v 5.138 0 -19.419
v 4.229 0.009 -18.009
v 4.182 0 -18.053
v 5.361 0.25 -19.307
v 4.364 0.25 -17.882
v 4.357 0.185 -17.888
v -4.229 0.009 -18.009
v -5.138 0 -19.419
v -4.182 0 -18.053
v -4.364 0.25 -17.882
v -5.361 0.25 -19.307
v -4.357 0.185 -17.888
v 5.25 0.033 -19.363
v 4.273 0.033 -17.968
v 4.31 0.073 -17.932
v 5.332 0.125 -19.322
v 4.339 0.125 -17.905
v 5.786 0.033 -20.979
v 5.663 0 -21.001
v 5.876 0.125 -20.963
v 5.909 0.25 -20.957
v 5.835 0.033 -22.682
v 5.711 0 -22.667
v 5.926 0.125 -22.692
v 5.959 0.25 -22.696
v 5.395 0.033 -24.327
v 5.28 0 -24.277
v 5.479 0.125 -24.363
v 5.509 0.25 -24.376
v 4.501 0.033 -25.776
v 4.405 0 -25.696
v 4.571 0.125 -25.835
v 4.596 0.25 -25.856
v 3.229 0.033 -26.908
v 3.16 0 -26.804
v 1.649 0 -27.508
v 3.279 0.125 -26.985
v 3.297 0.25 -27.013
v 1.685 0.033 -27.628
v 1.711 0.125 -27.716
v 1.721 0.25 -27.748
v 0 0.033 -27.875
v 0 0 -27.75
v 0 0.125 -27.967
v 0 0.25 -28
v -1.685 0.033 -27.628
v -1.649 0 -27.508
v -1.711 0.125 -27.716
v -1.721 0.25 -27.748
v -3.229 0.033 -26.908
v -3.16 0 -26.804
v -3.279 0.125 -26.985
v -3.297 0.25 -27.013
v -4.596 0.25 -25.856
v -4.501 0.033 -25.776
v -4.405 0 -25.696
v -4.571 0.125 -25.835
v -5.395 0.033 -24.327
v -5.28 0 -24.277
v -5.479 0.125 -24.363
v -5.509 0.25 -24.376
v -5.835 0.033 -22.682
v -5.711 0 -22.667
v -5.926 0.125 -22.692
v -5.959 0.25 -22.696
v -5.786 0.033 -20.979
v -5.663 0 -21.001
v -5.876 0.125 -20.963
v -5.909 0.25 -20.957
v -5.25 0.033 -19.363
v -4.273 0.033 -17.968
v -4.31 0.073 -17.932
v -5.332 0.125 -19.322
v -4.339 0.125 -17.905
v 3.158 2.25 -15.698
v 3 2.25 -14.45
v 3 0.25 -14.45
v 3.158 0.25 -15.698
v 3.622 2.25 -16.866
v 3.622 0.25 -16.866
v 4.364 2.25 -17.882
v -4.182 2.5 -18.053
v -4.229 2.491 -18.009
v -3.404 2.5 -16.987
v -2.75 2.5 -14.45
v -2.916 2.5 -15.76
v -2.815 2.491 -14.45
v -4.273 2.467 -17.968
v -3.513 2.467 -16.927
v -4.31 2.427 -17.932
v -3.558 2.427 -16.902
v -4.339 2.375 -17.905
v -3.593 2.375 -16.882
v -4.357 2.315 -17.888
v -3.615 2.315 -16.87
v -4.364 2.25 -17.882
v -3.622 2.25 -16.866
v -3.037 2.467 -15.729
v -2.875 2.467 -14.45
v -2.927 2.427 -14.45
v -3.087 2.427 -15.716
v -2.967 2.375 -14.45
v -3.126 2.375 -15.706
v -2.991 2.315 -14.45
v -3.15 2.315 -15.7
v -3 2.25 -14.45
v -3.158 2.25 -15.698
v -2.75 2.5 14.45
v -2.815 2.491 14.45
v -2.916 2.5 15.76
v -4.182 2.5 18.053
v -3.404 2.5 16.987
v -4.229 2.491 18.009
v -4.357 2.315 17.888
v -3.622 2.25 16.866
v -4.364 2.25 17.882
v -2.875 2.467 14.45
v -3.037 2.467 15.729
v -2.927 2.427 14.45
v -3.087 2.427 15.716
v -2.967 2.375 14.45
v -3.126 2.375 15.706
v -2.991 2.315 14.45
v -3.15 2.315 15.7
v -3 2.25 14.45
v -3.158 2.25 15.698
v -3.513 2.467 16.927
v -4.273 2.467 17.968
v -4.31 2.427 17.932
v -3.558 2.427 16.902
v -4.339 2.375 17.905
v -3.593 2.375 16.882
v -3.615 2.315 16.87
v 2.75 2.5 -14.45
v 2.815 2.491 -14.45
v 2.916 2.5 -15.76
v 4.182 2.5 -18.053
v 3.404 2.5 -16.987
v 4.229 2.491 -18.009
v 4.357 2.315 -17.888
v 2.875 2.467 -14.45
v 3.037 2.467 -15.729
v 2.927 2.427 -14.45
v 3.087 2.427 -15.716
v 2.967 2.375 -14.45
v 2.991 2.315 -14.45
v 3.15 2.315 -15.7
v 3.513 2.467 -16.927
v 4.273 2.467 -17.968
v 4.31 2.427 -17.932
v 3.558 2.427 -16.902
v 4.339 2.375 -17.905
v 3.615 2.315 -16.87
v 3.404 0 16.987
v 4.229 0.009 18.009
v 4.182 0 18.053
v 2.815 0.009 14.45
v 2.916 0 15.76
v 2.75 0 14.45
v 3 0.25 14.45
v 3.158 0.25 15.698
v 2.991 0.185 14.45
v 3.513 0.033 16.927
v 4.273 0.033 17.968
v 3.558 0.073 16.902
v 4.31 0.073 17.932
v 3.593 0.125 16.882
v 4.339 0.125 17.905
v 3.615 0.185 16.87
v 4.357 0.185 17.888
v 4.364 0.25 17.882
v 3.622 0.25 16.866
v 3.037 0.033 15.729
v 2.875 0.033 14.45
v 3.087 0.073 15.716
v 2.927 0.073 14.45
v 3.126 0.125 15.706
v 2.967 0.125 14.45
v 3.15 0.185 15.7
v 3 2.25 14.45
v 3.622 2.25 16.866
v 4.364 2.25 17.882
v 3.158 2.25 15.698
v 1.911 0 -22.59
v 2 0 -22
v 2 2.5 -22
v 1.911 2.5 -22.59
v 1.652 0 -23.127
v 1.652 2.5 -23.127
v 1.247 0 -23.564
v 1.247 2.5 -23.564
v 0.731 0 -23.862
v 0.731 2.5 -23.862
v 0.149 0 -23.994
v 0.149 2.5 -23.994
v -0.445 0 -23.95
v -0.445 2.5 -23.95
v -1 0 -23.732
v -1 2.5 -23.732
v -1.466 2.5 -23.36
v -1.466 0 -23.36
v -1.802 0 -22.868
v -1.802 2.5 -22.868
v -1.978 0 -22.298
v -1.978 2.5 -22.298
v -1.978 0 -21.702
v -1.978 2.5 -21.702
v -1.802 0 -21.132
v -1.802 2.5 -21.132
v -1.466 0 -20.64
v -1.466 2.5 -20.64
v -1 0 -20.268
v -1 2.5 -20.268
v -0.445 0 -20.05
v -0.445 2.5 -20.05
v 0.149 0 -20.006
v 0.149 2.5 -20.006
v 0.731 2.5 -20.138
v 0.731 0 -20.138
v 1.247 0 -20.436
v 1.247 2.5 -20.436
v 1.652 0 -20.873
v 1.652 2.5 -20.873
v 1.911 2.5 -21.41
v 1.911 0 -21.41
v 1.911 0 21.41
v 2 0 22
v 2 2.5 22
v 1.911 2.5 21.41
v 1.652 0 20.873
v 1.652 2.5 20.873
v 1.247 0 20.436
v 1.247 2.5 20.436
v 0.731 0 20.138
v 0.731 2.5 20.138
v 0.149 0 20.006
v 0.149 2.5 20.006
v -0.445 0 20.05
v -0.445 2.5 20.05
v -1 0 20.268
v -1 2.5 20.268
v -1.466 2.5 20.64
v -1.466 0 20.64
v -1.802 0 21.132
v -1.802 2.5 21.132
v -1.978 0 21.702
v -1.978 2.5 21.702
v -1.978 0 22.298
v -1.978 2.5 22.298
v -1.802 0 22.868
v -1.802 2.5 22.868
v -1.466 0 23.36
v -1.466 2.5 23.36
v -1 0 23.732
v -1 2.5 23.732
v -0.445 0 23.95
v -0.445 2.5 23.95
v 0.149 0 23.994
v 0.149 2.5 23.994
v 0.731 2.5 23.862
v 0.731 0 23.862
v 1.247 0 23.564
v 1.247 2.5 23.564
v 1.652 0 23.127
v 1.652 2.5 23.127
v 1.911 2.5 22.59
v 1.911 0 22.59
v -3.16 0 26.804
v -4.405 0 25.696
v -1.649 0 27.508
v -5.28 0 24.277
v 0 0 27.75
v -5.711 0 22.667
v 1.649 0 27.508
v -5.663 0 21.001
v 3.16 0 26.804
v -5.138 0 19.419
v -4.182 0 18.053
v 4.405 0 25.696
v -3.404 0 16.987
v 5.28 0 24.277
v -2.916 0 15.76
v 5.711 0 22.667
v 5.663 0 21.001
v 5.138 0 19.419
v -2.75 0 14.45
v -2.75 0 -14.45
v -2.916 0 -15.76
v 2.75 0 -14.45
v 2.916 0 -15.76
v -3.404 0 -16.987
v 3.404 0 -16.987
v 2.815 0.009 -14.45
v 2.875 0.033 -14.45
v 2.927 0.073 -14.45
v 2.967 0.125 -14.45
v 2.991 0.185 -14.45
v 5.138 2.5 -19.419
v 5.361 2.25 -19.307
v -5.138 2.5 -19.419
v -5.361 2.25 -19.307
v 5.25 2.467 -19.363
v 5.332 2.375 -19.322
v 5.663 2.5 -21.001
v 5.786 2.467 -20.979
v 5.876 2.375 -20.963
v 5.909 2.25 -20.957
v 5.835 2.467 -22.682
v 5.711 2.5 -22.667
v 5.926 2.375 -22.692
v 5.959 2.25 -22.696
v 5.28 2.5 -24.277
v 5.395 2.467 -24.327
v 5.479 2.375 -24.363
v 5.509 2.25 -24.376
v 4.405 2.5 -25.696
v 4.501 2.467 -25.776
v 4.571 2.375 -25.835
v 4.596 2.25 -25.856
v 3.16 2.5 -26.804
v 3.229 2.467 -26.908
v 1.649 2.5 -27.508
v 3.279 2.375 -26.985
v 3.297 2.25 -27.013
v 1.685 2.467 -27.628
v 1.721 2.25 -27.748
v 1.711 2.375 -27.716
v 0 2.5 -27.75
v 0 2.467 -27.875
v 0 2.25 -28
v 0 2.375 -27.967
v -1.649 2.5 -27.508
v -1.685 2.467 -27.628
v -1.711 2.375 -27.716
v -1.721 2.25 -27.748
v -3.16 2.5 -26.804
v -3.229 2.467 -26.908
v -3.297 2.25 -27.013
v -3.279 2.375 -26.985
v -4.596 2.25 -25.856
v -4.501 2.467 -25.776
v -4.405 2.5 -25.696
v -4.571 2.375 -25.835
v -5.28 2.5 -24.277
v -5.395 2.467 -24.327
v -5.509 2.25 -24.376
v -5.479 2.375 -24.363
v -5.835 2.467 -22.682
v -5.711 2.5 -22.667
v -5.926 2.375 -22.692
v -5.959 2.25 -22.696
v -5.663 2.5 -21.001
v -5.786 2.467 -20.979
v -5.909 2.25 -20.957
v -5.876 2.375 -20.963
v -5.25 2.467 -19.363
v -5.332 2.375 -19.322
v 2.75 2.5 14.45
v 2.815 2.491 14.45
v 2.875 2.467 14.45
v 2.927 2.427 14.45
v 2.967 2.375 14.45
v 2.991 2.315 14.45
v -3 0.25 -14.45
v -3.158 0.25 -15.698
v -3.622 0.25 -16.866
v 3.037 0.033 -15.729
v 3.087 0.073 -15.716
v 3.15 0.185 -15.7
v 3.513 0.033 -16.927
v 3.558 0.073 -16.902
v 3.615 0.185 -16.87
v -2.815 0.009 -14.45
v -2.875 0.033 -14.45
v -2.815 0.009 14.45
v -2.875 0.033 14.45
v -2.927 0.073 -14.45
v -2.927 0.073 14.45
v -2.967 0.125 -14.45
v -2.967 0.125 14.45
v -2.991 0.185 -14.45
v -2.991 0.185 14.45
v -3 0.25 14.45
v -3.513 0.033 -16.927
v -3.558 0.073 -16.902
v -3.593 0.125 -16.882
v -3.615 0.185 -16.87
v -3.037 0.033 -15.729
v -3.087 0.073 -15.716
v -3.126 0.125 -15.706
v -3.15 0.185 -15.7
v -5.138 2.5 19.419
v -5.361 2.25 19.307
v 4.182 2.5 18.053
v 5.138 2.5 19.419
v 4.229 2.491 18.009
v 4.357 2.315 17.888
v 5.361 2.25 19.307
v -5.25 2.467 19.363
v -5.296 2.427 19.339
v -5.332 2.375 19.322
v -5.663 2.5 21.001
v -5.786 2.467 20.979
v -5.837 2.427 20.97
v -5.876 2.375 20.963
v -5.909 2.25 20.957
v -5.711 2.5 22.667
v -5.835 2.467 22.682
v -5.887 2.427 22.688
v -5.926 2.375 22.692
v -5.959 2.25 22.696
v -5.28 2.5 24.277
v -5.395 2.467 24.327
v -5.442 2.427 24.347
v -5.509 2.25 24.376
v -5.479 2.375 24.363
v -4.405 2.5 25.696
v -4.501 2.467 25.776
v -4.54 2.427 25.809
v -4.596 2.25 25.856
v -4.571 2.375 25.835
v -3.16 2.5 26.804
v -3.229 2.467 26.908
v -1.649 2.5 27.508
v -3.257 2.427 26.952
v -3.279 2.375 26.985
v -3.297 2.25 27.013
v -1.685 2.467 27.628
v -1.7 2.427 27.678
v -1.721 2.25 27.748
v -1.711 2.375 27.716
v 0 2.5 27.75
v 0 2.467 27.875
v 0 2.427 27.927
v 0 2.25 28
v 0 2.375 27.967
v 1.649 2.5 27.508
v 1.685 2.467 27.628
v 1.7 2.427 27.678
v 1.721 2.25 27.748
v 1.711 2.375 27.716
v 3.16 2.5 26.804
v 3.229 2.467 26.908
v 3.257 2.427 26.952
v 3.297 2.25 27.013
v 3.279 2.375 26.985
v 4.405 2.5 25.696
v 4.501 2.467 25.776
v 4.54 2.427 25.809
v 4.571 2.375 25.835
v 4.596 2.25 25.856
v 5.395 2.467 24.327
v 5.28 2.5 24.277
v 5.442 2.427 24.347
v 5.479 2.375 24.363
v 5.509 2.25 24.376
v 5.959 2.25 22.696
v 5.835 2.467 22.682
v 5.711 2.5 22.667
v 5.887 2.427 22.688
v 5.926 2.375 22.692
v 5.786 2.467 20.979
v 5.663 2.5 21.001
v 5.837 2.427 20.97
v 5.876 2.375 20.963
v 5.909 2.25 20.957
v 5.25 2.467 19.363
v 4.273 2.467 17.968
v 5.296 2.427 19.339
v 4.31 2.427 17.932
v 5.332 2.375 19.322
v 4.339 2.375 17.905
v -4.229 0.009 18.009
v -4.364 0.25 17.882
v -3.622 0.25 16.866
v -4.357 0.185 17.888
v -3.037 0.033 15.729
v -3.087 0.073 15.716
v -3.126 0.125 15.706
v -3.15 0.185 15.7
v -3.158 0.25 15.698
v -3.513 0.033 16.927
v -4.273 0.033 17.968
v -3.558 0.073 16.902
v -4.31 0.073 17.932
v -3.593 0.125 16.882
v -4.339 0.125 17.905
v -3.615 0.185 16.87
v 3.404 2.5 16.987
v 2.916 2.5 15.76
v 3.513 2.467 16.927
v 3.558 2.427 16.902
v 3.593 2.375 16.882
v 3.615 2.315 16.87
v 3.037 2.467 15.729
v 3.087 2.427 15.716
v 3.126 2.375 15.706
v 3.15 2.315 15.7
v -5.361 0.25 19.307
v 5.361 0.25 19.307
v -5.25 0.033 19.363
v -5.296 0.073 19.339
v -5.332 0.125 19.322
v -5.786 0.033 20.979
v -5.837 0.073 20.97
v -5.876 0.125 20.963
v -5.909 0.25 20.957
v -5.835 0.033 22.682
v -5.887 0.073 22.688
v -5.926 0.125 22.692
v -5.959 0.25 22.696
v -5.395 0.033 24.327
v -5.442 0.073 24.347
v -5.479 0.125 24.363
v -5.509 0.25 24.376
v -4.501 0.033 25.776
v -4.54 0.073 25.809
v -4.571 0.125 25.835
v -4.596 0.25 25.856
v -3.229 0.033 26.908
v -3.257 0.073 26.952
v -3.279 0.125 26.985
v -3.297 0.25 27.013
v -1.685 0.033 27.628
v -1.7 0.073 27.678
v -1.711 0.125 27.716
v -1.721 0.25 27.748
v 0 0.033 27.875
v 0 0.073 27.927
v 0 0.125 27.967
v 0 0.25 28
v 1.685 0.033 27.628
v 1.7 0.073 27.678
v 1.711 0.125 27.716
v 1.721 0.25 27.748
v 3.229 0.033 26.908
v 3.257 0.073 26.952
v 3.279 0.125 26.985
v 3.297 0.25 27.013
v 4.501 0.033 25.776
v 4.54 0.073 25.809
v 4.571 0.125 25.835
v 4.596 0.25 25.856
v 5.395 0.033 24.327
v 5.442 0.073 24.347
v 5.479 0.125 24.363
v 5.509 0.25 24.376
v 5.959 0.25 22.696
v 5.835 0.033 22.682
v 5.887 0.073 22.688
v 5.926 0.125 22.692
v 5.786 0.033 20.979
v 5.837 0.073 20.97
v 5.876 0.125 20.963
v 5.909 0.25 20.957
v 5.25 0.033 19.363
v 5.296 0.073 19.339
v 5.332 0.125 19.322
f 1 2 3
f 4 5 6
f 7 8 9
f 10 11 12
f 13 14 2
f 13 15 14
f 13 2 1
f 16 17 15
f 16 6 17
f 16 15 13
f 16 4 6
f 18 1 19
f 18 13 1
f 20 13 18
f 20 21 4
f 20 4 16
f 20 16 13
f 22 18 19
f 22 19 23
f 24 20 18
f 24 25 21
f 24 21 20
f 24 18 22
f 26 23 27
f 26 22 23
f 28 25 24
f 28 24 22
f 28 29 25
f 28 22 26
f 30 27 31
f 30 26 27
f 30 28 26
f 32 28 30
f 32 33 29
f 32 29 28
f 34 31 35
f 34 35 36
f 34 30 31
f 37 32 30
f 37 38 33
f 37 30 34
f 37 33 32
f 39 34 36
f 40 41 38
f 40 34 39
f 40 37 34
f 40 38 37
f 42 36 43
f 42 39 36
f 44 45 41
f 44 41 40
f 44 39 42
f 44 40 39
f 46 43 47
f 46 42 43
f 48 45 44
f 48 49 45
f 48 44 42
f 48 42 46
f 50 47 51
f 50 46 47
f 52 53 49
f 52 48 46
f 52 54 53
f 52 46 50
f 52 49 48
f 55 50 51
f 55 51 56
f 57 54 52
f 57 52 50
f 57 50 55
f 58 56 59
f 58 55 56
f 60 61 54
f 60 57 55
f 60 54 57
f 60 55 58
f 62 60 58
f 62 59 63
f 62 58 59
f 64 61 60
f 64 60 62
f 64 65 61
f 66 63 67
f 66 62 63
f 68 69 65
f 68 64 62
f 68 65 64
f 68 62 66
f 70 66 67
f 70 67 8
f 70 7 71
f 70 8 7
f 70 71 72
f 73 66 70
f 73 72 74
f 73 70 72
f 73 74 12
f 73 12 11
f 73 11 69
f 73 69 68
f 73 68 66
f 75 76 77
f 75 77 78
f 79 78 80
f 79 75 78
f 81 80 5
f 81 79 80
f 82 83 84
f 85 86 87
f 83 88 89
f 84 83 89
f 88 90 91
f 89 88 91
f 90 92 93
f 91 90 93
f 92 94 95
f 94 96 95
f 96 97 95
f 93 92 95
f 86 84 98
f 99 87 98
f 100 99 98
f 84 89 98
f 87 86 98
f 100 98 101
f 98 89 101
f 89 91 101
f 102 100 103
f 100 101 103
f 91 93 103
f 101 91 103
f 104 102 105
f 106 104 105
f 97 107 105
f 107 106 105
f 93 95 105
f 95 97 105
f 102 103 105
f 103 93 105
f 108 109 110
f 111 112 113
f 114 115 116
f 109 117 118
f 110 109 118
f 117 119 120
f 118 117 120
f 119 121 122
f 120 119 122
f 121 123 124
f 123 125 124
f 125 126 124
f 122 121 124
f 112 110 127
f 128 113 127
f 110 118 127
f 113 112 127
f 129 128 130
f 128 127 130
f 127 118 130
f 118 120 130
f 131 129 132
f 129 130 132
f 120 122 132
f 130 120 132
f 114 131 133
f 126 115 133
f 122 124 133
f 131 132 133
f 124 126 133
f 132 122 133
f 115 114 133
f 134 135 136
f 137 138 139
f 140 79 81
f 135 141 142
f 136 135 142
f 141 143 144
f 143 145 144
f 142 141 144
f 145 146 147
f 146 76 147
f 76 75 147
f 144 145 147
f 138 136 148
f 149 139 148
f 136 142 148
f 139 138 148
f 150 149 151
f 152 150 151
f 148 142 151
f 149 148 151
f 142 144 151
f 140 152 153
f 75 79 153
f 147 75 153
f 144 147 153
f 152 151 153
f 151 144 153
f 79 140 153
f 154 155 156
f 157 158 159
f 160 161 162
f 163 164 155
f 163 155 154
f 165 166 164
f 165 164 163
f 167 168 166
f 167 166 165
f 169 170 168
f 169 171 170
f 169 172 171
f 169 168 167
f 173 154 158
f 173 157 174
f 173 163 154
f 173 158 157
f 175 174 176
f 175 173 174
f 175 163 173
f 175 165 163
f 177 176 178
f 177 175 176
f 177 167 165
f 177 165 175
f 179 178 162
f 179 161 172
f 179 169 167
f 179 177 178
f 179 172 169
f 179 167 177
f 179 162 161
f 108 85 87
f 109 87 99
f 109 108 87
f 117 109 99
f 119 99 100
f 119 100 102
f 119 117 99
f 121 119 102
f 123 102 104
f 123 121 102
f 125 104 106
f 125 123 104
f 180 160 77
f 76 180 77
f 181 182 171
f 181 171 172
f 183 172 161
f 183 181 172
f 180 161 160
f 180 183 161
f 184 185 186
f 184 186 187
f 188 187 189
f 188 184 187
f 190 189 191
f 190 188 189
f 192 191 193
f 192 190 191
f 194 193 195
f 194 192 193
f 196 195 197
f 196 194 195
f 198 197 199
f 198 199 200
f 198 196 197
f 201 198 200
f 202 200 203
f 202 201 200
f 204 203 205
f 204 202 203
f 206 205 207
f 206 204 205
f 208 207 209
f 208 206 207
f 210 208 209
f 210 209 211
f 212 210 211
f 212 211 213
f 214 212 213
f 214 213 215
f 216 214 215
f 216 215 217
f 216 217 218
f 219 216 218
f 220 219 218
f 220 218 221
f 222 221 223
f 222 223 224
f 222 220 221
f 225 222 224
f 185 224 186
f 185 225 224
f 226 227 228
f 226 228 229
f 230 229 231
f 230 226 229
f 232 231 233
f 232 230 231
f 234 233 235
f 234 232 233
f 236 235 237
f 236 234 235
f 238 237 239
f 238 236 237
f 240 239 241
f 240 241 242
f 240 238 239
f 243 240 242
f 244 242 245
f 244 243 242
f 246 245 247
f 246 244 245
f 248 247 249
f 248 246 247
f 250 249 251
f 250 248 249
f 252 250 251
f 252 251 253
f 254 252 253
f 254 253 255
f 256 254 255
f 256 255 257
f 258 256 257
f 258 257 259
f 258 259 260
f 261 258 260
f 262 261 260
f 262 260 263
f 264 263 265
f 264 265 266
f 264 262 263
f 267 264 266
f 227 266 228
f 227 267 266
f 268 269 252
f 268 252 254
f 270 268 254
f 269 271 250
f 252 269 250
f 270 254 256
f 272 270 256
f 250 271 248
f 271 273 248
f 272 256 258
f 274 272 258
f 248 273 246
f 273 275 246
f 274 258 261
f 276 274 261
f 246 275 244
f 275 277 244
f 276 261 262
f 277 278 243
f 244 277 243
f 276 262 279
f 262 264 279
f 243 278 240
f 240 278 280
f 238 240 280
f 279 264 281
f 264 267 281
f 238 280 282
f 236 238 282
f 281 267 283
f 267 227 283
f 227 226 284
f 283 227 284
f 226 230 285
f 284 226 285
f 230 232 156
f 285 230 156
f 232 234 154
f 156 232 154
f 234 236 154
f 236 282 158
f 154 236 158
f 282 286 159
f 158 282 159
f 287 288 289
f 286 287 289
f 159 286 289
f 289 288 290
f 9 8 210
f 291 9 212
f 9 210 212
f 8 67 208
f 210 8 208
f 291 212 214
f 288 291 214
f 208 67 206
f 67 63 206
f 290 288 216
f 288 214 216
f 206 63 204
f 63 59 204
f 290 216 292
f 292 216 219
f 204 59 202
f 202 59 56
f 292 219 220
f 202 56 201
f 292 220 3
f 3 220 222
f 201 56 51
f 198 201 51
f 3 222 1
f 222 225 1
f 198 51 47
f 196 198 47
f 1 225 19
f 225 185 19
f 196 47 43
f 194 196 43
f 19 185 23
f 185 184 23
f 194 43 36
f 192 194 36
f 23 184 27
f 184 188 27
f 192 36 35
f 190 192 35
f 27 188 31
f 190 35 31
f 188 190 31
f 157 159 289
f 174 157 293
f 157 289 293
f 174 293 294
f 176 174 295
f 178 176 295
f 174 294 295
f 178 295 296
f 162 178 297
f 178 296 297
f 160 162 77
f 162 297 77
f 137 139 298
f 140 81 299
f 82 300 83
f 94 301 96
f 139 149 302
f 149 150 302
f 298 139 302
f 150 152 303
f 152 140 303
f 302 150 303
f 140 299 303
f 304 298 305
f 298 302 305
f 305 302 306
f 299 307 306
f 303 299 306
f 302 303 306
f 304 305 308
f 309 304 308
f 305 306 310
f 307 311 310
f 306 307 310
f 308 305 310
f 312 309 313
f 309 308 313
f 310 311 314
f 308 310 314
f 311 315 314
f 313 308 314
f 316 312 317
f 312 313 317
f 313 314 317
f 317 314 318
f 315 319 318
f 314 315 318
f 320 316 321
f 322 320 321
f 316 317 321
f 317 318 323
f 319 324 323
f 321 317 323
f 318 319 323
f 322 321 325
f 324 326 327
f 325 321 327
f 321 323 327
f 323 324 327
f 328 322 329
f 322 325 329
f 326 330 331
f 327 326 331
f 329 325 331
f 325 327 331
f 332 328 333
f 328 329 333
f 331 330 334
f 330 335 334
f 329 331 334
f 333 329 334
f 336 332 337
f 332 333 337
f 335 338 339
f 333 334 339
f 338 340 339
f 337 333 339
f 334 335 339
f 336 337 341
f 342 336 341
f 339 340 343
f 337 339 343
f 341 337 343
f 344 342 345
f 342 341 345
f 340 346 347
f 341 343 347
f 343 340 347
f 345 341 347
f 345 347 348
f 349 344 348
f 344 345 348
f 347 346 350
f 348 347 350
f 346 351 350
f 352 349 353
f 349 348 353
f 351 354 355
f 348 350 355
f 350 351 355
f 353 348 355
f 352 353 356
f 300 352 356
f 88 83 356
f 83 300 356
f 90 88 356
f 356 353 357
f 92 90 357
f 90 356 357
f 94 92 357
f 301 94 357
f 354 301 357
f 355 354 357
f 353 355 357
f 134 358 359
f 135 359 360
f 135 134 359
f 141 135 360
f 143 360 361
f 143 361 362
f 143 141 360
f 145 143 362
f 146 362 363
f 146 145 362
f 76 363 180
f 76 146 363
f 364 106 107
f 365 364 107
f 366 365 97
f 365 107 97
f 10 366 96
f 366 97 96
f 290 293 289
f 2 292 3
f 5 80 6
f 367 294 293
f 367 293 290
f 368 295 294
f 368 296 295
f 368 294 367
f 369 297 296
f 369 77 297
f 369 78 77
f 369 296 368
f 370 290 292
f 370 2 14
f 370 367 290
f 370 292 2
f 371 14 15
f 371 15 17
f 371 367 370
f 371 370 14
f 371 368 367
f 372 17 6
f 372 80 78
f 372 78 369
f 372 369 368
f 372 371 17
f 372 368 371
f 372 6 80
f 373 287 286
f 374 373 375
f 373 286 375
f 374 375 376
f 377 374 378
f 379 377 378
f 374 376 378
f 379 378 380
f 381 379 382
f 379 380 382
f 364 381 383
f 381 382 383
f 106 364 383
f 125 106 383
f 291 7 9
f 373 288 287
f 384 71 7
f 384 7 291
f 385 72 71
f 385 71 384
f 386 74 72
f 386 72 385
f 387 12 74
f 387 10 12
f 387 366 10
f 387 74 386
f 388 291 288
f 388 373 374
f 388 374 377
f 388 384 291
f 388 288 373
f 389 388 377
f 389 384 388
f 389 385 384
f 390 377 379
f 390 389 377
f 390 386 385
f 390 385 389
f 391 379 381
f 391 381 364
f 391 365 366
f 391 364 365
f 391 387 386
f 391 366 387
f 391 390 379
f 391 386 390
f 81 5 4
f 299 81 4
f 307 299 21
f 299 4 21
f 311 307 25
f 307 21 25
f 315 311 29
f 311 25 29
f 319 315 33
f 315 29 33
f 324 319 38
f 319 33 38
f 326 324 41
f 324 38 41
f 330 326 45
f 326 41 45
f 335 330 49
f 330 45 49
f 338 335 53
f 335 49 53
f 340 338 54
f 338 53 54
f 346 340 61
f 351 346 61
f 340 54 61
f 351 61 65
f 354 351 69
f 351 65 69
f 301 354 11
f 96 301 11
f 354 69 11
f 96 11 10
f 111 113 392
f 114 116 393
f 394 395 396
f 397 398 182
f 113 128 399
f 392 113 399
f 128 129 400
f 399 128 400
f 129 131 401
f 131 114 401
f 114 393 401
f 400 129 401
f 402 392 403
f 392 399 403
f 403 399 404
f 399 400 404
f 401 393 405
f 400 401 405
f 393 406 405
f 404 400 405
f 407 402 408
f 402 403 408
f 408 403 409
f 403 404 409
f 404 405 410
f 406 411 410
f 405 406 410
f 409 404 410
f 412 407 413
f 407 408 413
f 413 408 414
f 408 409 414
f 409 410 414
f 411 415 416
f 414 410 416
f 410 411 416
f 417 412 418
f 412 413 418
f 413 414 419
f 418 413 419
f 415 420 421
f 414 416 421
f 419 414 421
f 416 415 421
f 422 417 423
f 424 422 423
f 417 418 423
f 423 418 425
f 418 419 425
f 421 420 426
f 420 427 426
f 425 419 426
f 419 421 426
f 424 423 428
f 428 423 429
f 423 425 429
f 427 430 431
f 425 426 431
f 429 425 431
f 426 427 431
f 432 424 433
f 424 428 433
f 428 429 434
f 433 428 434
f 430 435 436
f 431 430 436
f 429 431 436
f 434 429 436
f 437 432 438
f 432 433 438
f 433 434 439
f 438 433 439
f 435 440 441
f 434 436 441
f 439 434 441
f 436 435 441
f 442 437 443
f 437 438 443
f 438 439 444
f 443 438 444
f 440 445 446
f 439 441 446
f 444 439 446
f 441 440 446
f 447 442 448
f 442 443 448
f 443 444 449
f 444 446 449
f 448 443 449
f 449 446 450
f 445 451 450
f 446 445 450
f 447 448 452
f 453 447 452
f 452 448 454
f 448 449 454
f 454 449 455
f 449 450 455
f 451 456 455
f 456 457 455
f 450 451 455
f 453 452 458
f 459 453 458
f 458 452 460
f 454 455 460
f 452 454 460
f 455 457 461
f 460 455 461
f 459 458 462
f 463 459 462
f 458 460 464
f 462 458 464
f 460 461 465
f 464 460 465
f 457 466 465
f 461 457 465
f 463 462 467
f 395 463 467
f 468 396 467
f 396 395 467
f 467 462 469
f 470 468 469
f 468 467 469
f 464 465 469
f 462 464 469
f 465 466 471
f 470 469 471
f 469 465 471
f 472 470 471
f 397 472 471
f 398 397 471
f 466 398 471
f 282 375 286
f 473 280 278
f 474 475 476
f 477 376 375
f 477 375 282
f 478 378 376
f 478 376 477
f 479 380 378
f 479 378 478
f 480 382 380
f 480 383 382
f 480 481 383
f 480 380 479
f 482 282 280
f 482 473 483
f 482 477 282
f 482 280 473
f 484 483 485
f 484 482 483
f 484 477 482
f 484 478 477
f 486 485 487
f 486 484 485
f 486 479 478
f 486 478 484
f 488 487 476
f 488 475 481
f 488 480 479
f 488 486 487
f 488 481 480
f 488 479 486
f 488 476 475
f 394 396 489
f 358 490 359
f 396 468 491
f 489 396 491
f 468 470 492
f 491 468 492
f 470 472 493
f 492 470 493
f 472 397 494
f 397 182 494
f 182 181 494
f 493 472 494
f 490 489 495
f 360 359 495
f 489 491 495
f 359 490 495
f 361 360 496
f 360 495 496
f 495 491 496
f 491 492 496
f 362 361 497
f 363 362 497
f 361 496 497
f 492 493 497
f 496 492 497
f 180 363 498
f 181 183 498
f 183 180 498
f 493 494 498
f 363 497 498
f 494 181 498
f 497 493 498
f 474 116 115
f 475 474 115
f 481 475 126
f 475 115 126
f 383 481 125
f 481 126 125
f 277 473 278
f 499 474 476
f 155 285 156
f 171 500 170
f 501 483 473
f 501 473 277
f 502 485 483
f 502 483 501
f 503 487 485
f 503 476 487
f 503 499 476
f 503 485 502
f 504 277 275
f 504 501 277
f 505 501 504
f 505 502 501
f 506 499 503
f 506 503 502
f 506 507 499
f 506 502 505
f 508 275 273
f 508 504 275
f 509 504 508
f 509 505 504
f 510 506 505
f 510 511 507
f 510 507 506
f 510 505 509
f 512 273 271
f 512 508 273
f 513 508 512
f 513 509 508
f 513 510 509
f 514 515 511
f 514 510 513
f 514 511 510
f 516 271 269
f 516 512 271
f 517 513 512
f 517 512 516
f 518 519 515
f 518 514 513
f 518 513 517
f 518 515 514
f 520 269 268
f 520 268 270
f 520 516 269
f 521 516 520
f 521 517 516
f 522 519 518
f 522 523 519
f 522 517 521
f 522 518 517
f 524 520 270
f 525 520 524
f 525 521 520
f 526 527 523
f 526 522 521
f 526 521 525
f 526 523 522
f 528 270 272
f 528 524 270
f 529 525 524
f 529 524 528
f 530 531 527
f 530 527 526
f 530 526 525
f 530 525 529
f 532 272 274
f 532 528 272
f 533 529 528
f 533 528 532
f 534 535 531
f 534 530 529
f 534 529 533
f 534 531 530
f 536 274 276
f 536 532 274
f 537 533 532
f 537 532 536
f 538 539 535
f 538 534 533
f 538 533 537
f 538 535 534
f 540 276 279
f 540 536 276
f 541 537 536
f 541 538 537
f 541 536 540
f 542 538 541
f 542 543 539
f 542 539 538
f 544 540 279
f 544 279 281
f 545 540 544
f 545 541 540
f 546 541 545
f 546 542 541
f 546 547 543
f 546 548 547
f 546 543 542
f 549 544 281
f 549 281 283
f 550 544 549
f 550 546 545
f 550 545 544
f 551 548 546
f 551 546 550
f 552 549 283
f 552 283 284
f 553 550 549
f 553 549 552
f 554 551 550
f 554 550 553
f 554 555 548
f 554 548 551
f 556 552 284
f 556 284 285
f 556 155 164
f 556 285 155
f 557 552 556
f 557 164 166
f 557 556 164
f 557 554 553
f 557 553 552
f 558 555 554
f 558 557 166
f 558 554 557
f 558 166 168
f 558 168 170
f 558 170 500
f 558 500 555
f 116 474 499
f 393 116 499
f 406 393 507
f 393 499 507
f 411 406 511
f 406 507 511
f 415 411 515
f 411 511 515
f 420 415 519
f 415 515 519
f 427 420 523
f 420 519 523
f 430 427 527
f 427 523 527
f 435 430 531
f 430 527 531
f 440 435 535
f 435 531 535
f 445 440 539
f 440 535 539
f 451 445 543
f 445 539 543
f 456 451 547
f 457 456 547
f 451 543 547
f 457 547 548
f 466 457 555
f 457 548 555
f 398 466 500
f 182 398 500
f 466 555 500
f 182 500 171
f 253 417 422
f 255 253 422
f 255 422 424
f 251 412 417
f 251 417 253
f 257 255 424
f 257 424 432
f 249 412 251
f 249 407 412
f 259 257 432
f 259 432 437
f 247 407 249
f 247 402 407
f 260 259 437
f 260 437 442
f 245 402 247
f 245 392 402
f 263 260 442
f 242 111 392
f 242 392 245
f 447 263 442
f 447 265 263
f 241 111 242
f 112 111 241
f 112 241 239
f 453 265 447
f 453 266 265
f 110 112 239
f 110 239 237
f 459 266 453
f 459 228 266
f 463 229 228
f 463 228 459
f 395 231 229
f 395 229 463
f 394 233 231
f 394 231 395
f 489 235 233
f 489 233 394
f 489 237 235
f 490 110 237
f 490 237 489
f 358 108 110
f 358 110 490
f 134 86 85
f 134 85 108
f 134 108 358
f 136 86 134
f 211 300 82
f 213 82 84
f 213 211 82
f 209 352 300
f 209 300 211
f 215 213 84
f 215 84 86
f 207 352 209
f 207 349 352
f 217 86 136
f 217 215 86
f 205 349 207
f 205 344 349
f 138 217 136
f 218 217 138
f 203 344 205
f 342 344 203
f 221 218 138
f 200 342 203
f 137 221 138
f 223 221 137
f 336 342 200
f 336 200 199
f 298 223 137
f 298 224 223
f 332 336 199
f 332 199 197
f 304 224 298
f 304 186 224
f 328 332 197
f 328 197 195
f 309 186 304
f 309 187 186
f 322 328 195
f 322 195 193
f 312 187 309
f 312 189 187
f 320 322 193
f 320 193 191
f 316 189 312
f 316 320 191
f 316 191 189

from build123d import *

# Parameters (mm, degrees)
SKETCH1_R           = 2
BOSS_EXTRUDE1_DEPTH = 2.5
FILLET1_R           = 5
FILLET2_R           = 0.25


with BuildPart() as part:
    # Sketch1 → Boss-Extrude1 (new body)
    with BuildSketch(Plane(origin=(0, 0, 0), x_dir=(1, 0, 0), z_dir=(0, 1, 0))):
        with BuildLine():
            ThreePointArc((-3, -16.803847577), (0, -28), (3, -16.803847577))
            Line((3, -16.803847577), (3, 16.803847577))
            ThreePointArc((3, 16.803847577), (0, 28), (-3, 16.803847577))
            Line((-3, 16.803847577), (-3, -16.803847577))
        make_face()
        with Locations((0, -22)):
            Circle(SKETCH1_R, mode=Mode.SUBTRACT)
        with Locations((0, 22)):
            Circle(SKETCH1_R, mode=Mode.SUBTRACT)
    extrude(amount=BOSS_EXTRUDE1_DEPTH)

    # Fillet1
    fillet1_edges = [part.edges().sort_by_distance(p)[0] for p in [
        (-3, 1.25, 16.803847577),
        (-3, 1.25, -16.803847577),
        (3, 1.25, -16.803847577),
        (3, 1.25, 16.803847577),
    ]]
    fillet(fillet1_edges, radius=FILLET1_R)

    # Fillet2
    fillet2_edges = [part.edges().sort_by_distance(p)[0] for p in [
        (0, 0, -28),
        (0, 2.5, -28),
        (3, 0, 0),
        (3, 2.5, 0),
        (0, 0, 28),
        (0, 2.5, 28),
        (-3, 0, 0),
        (-3, 2.5, 0),
        (3.353398114, 0, -16.296537929),
        (3.353398114, 2.5, -16.296537929),
        (3.353398114, 0, 16.296537929),
        (3.353398114, 2.5, 16.296537929),
        (-3.353398114, 0, 16.296537929),
        (-3.353398114, 2.5, 16.296537929),
        (-3.353398114, 0, -16.296537929),
        (-3.353398114, 2.5, -16.296537929),
    ]]
    fillet(fillet2_edges, radius=FILLET2_R)


solid = part.part
